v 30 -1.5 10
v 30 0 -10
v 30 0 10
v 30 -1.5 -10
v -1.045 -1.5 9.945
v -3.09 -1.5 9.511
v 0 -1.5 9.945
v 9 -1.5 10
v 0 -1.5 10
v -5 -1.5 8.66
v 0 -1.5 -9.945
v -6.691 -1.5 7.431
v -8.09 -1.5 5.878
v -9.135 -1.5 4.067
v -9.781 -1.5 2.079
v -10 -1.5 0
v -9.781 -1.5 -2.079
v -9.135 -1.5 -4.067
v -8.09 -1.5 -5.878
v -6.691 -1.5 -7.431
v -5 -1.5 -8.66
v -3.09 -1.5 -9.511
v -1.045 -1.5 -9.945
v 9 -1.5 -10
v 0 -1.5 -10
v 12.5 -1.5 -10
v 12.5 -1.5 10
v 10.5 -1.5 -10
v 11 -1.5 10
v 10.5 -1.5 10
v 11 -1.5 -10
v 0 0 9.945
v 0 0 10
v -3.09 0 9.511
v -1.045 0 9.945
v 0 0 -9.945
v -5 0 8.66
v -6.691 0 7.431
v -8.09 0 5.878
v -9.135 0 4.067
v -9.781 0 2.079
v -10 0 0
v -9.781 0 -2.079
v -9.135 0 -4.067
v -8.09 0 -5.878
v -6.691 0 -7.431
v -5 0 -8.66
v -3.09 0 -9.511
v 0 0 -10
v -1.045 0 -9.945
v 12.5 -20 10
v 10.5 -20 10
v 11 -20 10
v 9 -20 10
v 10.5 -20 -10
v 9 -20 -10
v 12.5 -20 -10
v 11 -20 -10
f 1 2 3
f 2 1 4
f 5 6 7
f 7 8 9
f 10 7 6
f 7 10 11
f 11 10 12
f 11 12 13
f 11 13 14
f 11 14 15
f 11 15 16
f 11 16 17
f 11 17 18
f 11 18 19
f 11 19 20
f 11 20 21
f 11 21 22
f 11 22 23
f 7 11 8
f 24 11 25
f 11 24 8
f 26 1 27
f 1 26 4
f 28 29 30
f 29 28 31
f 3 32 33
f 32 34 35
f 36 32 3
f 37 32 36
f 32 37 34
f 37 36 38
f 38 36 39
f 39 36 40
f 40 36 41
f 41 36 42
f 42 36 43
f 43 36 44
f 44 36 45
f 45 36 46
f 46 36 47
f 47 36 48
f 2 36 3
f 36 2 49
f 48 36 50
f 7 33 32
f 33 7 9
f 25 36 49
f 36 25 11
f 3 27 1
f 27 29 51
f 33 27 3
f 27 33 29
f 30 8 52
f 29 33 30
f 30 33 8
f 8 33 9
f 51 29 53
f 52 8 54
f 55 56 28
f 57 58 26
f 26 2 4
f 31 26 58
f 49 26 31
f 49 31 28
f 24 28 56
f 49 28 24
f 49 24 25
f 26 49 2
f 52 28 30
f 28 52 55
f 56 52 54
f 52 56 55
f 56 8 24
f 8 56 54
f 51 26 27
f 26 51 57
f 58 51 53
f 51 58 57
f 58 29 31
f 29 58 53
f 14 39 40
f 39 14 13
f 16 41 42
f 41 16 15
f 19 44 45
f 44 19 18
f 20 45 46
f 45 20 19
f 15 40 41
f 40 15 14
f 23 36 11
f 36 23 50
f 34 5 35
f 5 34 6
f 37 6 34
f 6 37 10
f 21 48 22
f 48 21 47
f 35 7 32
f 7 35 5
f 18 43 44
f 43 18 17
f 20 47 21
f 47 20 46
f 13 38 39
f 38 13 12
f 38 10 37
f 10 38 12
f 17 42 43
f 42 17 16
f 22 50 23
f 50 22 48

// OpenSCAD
//Set shoe width in mm
width=20;
length=width*1.5;

//Set shoe wall width in mm
wall=1.5;
holderheight=width;

//Set shoe holder in percent of the shoe length
holderplace=.3;

//Set gap for the holder so the paper is held tight in mm
holdergap=.5;


rotate([90,0,0])
union()
{
    cylinder(r=width/2,h=wall);
    translate([0,-width/2,0])
    {
        cube([length,width,wall]);

        //holders
        translate([length*holderplace,0,0])
            cube([wall,width,holderheight]);
        translate([length*holderplace+wall+holdergap,0,0])
            cube([wall,width,holderheight]);
    }
}
